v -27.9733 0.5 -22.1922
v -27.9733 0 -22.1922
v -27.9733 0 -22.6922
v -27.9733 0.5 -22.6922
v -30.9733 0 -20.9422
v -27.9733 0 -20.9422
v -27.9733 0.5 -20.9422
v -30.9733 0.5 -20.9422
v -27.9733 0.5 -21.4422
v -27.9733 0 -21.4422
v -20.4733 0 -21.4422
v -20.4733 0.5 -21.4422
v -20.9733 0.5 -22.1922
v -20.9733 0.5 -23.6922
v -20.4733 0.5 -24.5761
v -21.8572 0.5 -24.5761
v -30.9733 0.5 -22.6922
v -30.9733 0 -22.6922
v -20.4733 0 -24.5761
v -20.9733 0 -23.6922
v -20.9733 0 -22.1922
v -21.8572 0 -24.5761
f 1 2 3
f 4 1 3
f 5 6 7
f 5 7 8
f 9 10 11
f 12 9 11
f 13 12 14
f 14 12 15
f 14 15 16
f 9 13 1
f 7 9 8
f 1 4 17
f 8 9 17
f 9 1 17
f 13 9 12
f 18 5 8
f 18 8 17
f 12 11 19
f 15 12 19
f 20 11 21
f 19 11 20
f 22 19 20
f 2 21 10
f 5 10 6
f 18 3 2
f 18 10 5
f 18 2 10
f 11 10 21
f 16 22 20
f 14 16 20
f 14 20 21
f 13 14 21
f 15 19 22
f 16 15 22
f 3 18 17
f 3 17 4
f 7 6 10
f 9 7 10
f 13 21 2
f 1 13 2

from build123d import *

# Parameters (mm, degrees)
BOSS_EXTRUDE1_DEPTH = 0.5


with BuildPart() as part:
    # Sketch1 → Boss-Extrude1 (new body)
    with BuildSketch(Plane(origin=(0, 0, 0), x_dir=(1, 0, 0), z_dir=(0, 1, 0))):
        Polygon((-30.973296771, 20.942182778), (-30.973296771, 22.692182778), (-27.973296771, 22.692182778), (-27.973296771, 22.192182778), (-27.973296771, 21.442182778), (-27.973296771, 20.942182778), align=None)
        Polygon((-27.973296771, 22.192182778), (-27.973296771, 21.442182778), (-20.473296771, 21.442182778), (-20.473296771, 24.576066254), (-21.857180247, 24.576066254), (-20.973296771, 23.692182778), (-20.973296771, 22.192182778), align=None)
    extrude(amount=BOSS_EXTRUDE1_DEPTH)


solid = part.part
